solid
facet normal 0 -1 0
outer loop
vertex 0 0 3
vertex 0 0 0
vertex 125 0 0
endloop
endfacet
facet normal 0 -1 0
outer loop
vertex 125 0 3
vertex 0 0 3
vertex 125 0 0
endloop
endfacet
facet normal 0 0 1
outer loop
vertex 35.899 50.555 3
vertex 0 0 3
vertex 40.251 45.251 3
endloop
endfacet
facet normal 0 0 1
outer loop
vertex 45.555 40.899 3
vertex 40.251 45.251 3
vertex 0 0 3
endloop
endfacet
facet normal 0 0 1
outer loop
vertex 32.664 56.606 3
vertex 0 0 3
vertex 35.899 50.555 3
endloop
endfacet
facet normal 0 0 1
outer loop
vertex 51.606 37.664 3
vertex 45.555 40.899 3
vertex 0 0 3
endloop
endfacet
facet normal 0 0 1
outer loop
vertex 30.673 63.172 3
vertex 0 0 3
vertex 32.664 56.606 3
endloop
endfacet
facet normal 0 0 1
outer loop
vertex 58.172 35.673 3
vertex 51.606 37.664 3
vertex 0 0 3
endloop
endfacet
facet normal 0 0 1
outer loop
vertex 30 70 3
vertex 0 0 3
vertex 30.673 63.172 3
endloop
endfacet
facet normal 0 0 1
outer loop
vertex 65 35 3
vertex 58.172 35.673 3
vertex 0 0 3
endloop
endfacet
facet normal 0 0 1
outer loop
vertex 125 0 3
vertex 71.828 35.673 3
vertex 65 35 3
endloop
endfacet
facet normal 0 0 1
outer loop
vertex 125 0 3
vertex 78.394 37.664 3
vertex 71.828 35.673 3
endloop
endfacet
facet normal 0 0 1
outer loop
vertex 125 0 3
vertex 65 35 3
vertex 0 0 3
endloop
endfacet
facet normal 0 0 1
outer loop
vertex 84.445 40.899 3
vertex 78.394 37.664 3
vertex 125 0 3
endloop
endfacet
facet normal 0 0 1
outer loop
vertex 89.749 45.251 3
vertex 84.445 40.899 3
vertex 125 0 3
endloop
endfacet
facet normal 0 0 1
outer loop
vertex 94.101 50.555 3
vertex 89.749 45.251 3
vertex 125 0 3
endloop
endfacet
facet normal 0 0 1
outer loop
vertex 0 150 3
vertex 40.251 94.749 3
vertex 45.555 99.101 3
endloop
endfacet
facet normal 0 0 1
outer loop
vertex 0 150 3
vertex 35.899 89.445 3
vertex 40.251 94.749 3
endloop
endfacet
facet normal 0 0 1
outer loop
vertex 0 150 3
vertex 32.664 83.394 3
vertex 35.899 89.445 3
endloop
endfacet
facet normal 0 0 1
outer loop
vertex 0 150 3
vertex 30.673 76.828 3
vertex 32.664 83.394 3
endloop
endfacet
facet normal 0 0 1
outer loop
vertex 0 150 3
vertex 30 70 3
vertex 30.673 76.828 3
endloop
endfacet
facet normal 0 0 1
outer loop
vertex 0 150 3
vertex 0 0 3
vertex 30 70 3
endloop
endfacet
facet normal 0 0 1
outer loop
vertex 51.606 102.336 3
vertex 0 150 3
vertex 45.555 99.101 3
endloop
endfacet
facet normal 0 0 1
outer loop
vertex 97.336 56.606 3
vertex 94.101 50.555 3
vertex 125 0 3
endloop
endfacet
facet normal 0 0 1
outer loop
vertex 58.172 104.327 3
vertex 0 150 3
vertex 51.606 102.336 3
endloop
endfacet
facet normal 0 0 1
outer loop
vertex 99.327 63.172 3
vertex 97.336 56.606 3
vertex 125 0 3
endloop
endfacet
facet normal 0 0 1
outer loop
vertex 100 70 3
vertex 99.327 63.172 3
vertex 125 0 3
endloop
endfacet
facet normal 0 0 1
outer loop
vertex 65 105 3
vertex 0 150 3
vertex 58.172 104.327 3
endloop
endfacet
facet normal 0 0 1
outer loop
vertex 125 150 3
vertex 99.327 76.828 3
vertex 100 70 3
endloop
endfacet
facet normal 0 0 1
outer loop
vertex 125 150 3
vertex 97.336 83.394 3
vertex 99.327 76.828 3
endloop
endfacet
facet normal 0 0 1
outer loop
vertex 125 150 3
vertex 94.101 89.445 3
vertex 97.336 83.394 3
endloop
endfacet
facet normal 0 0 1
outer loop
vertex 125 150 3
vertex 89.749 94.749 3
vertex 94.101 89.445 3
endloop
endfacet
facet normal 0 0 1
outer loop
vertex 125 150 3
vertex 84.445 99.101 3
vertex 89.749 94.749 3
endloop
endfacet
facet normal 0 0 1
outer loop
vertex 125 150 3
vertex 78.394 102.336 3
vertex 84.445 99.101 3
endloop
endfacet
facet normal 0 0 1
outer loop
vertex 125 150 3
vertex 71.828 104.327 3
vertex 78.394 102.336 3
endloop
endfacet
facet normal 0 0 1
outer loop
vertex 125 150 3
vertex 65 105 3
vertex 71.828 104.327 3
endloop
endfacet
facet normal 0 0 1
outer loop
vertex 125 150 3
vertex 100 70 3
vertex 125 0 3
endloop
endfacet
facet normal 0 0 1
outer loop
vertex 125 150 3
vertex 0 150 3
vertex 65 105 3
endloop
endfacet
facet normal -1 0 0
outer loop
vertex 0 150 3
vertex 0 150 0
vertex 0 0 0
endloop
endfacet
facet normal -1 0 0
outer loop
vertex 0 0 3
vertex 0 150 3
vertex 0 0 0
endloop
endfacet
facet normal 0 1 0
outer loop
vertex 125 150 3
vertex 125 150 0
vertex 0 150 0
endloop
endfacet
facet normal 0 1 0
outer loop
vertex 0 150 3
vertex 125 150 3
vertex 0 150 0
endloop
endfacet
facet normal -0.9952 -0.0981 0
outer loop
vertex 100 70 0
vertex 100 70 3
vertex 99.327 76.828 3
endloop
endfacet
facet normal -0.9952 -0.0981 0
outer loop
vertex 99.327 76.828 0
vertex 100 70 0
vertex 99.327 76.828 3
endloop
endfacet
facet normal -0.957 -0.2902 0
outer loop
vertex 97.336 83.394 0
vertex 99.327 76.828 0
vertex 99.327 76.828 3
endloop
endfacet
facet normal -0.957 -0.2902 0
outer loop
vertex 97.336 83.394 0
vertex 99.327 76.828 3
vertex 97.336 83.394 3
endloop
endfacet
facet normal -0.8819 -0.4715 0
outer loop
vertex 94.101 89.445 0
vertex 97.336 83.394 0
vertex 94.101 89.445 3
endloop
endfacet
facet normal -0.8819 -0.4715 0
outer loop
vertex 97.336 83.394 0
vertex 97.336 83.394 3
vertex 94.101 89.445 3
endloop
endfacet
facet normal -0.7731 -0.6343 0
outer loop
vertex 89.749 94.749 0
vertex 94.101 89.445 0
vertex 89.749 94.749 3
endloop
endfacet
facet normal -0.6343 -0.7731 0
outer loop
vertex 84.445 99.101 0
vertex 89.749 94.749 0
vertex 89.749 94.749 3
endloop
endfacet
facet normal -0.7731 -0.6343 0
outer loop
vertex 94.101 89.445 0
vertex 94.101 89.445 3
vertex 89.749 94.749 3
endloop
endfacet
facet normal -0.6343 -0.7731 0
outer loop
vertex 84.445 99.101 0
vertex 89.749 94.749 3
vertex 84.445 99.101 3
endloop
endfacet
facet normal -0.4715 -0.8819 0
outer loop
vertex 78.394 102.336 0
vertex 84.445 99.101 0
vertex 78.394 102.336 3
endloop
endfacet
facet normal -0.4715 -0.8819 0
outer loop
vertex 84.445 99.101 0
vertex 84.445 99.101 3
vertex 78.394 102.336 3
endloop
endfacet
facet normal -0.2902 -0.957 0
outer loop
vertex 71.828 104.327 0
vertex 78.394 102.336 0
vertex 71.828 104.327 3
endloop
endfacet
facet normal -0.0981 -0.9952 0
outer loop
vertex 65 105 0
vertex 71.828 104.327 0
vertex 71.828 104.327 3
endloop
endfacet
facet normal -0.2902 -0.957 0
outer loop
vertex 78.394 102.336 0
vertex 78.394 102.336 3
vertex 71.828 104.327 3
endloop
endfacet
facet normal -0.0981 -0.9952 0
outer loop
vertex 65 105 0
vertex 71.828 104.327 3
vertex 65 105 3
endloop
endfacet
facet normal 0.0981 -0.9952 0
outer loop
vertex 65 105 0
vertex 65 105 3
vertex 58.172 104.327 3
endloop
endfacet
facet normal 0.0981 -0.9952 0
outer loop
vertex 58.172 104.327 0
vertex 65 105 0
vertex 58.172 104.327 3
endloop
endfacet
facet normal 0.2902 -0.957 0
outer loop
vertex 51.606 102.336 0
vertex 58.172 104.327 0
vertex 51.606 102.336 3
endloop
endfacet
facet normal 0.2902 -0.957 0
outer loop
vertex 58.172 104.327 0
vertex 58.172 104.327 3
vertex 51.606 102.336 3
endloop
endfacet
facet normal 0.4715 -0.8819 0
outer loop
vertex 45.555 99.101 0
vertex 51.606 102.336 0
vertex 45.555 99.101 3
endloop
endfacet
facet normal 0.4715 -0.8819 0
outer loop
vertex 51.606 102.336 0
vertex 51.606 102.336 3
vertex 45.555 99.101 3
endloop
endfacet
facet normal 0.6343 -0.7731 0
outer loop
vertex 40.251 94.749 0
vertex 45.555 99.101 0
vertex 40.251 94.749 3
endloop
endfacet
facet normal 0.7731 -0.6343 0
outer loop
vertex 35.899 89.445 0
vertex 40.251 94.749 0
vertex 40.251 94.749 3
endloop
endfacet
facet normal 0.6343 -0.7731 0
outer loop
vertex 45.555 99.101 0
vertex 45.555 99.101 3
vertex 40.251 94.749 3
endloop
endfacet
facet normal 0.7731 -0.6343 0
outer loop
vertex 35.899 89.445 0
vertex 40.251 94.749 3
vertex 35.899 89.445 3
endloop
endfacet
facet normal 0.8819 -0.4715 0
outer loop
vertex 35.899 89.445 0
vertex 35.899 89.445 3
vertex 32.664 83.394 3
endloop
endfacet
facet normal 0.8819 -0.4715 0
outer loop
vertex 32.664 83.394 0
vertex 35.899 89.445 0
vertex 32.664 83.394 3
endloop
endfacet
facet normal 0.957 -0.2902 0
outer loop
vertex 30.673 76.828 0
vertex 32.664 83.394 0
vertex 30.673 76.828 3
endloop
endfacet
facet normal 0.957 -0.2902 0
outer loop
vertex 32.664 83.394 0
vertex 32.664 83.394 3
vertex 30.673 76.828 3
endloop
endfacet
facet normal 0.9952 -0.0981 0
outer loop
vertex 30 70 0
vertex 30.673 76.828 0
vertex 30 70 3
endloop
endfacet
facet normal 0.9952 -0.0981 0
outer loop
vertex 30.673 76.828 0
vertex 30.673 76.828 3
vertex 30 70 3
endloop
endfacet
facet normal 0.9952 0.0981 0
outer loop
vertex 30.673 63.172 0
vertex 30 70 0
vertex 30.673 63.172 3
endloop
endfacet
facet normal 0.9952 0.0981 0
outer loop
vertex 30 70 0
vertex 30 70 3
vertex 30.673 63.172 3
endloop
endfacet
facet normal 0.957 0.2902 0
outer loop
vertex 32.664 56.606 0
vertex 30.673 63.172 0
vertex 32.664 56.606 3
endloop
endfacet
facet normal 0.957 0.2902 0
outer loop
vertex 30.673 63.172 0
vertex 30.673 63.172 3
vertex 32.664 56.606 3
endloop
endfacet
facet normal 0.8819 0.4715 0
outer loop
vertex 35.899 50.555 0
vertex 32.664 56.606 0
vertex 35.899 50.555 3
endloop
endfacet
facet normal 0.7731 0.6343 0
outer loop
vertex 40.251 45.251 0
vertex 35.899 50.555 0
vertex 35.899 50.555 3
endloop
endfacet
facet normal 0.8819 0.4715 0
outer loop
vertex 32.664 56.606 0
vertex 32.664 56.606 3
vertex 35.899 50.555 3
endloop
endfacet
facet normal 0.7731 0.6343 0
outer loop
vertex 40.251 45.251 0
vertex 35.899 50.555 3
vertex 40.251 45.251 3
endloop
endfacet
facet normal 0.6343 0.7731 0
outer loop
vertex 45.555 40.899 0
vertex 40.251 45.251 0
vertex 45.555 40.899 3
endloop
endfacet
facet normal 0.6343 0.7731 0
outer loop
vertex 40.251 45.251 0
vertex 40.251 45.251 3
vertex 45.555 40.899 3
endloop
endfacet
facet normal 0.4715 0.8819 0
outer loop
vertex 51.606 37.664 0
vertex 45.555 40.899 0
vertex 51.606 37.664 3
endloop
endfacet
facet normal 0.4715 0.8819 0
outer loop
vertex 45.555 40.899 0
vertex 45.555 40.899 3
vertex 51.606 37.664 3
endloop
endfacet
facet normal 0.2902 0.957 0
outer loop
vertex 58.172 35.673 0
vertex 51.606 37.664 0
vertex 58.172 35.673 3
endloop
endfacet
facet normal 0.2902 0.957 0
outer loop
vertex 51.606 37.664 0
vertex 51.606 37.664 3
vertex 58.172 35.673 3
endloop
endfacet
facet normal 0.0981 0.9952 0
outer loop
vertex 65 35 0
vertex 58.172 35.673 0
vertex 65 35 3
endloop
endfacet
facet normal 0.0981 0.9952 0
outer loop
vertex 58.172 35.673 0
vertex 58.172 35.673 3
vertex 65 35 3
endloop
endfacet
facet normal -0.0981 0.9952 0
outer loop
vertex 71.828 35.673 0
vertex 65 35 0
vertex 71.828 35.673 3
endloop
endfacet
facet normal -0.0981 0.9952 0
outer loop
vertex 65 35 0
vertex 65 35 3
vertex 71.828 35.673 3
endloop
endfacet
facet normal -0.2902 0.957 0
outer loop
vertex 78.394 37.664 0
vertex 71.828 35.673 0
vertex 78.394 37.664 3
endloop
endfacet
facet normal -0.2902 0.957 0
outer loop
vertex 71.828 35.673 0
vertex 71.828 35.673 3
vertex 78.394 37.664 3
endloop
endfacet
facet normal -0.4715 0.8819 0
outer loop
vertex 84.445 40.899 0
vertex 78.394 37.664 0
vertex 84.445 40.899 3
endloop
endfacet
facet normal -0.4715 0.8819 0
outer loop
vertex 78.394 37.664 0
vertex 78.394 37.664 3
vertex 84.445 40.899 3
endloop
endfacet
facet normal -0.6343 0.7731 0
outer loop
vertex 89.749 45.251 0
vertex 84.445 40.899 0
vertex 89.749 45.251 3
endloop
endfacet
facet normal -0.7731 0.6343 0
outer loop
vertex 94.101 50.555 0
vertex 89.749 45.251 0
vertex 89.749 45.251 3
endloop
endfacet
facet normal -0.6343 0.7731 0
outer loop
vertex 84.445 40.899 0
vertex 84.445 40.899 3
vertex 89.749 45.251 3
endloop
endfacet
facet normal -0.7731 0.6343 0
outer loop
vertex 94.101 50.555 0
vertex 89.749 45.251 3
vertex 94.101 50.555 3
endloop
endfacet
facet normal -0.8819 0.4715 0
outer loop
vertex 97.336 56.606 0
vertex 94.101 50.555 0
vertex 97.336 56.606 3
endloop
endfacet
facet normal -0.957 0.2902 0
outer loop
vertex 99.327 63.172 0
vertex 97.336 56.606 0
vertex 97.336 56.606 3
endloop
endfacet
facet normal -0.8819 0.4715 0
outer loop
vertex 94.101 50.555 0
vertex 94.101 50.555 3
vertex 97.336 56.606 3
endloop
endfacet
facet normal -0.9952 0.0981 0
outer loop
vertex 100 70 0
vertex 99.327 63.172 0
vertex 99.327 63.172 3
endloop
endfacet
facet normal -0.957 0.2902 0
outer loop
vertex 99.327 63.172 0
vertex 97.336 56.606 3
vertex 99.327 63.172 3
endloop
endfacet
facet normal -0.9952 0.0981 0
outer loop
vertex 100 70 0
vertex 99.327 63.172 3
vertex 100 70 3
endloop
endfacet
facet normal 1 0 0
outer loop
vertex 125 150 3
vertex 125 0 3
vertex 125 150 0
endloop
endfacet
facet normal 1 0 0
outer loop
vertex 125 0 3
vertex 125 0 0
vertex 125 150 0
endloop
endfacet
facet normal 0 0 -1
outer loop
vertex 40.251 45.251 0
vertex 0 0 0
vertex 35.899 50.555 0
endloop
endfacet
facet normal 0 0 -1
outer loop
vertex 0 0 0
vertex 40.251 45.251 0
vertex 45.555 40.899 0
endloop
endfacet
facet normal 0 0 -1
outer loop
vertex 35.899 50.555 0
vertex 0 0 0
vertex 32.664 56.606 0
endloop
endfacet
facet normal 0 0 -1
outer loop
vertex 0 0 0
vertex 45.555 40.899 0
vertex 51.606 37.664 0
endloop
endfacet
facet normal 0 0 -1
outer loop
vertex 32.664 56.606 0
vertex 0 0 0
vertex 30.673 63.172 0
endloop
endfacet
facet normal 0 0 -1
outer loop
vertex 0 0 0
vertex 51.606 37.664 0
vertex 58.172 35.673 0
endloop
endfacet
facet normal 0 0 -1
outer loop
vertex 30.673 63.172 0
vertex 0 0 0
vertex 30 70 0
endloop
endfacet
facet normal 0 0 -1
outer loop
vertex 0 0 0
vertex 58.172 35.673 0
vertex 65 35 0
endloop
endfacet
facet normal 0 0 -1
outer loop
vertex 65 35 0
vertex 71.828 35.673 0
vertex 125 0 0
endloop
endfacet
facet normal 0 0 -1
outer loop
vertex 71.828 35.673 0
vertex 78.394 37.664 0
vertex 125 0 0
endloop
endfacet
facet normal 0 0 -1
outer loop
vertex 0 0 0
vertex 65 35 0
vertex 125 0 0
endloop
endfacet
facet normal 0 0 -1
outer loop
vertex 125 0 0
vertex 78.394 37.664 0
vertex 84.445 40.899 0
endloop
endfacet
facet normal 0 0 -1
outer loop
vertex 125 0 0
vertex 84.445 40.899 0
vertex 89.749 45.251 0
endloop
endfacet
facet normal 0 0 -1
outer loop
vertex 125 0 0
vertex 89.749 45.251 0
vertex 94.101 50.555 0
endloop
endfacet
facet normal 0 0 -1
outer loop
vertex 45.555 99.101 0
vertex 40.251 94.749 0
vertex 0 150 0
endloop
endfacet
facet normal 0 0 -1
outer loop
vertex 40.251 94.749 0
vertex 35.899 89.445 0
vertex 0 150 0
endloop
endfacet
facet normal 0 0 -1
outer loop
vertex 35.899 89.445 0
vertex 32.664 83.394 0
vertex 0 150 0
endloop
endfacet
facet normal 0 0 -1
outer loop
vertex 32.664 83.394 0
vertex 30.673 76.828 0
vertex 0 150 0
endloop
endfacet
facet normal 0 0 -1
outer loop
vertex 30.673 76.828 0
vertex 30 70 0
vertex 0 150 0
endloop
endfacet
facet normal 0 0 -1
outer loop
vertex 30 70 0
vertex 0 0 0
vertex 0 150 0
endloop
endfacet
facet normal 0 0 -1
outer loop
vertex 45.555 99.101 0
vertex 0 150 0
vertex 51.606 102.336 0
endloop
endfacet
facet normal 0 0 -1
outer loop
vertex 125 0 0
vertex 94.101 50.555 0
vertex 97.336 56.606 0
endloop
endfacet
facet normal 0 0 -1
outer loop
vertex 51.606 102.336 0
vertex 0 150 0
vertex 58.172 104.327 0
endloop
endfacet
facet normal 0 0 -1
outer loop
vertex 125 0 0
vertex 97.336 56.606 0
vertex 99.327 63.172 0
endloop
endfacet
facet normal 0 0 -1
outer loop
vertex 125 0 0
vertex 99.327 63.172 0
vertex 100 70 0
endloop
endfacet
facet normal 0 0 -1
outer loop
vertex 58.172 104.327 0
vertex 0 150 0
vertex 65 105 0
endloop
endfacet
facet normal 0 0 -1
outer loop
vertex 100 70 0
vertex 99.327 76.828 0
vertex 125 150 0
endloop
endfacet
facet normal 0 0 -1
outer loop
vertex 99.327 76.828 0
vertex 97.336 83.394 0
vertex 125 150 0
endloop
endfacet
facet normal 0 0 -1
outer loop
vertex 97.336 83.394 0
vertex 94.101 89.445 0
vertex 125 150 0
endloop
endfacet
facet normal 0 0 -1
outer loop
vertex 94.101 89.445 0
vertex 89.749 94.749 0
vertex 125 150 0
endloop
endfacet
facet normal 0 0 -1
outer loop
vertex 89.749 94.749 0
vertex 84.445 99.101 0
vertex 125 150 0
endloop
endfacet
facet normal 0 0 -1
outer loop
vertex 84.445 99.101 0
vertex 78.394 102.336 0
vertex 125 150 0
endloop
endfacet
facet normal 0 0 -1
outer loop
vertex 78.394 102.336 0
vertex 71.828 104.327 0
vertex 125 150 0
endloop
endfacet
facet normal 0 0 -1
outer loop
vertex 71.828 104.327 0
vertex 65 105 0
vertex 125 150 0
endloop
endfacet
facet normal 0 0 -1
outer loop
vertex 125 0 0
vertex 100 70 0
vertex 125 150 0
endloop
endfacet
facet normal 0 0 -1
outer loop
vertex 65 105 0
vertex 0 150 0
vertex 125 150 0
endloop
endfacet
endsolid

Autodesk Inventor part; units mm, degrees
ref_plane "YZ Plane" through (0, 0, 0) normal (1, 0, 0) x (0, 1, 0)
ref_plane "XZ Plane" through (0, 0, 0) normal (0, 1, 0) x (-1, 0, 0)
ref_plane "XY Plane" through (0, 0, 0) normal (0, 0, 1) x (1, 0, 0)
sketch "Esquisse1" plane through (0, 0, 0) normal (0, 0, 1) x (1, 0, 0)
  line L0 (0, 0) -> (125, 0)
  line L1 (125, 0) -> (125, 150)
  line L2 (125, 150) -> (0, 150)
  line L3 (0, 150) -> (0, 0)
  dimension "d0" = 125
  dimension "d1" = 150
extrude "Extrusion1" add sketch "Esquisse1" along normal blind 3
sketch "Esquisse2" plane through (0, 0, 3) normal (0, 0, 1) x (1, 0, 0)
  circle A0 centre (65, 70) radius 35
  line L0 (125, 0) -> (125, 150) projected
  line L1 (125, 150) -> (0, 150) projected
  point P0 (0, 0)
  dimension "d4" = 70
  dimension "d5" = 60
  dimension "d6" = 80
extrude "Extrusion2" cut sketch "Esquisse2" against normal blind 3
properties part number "cale-moteur"
